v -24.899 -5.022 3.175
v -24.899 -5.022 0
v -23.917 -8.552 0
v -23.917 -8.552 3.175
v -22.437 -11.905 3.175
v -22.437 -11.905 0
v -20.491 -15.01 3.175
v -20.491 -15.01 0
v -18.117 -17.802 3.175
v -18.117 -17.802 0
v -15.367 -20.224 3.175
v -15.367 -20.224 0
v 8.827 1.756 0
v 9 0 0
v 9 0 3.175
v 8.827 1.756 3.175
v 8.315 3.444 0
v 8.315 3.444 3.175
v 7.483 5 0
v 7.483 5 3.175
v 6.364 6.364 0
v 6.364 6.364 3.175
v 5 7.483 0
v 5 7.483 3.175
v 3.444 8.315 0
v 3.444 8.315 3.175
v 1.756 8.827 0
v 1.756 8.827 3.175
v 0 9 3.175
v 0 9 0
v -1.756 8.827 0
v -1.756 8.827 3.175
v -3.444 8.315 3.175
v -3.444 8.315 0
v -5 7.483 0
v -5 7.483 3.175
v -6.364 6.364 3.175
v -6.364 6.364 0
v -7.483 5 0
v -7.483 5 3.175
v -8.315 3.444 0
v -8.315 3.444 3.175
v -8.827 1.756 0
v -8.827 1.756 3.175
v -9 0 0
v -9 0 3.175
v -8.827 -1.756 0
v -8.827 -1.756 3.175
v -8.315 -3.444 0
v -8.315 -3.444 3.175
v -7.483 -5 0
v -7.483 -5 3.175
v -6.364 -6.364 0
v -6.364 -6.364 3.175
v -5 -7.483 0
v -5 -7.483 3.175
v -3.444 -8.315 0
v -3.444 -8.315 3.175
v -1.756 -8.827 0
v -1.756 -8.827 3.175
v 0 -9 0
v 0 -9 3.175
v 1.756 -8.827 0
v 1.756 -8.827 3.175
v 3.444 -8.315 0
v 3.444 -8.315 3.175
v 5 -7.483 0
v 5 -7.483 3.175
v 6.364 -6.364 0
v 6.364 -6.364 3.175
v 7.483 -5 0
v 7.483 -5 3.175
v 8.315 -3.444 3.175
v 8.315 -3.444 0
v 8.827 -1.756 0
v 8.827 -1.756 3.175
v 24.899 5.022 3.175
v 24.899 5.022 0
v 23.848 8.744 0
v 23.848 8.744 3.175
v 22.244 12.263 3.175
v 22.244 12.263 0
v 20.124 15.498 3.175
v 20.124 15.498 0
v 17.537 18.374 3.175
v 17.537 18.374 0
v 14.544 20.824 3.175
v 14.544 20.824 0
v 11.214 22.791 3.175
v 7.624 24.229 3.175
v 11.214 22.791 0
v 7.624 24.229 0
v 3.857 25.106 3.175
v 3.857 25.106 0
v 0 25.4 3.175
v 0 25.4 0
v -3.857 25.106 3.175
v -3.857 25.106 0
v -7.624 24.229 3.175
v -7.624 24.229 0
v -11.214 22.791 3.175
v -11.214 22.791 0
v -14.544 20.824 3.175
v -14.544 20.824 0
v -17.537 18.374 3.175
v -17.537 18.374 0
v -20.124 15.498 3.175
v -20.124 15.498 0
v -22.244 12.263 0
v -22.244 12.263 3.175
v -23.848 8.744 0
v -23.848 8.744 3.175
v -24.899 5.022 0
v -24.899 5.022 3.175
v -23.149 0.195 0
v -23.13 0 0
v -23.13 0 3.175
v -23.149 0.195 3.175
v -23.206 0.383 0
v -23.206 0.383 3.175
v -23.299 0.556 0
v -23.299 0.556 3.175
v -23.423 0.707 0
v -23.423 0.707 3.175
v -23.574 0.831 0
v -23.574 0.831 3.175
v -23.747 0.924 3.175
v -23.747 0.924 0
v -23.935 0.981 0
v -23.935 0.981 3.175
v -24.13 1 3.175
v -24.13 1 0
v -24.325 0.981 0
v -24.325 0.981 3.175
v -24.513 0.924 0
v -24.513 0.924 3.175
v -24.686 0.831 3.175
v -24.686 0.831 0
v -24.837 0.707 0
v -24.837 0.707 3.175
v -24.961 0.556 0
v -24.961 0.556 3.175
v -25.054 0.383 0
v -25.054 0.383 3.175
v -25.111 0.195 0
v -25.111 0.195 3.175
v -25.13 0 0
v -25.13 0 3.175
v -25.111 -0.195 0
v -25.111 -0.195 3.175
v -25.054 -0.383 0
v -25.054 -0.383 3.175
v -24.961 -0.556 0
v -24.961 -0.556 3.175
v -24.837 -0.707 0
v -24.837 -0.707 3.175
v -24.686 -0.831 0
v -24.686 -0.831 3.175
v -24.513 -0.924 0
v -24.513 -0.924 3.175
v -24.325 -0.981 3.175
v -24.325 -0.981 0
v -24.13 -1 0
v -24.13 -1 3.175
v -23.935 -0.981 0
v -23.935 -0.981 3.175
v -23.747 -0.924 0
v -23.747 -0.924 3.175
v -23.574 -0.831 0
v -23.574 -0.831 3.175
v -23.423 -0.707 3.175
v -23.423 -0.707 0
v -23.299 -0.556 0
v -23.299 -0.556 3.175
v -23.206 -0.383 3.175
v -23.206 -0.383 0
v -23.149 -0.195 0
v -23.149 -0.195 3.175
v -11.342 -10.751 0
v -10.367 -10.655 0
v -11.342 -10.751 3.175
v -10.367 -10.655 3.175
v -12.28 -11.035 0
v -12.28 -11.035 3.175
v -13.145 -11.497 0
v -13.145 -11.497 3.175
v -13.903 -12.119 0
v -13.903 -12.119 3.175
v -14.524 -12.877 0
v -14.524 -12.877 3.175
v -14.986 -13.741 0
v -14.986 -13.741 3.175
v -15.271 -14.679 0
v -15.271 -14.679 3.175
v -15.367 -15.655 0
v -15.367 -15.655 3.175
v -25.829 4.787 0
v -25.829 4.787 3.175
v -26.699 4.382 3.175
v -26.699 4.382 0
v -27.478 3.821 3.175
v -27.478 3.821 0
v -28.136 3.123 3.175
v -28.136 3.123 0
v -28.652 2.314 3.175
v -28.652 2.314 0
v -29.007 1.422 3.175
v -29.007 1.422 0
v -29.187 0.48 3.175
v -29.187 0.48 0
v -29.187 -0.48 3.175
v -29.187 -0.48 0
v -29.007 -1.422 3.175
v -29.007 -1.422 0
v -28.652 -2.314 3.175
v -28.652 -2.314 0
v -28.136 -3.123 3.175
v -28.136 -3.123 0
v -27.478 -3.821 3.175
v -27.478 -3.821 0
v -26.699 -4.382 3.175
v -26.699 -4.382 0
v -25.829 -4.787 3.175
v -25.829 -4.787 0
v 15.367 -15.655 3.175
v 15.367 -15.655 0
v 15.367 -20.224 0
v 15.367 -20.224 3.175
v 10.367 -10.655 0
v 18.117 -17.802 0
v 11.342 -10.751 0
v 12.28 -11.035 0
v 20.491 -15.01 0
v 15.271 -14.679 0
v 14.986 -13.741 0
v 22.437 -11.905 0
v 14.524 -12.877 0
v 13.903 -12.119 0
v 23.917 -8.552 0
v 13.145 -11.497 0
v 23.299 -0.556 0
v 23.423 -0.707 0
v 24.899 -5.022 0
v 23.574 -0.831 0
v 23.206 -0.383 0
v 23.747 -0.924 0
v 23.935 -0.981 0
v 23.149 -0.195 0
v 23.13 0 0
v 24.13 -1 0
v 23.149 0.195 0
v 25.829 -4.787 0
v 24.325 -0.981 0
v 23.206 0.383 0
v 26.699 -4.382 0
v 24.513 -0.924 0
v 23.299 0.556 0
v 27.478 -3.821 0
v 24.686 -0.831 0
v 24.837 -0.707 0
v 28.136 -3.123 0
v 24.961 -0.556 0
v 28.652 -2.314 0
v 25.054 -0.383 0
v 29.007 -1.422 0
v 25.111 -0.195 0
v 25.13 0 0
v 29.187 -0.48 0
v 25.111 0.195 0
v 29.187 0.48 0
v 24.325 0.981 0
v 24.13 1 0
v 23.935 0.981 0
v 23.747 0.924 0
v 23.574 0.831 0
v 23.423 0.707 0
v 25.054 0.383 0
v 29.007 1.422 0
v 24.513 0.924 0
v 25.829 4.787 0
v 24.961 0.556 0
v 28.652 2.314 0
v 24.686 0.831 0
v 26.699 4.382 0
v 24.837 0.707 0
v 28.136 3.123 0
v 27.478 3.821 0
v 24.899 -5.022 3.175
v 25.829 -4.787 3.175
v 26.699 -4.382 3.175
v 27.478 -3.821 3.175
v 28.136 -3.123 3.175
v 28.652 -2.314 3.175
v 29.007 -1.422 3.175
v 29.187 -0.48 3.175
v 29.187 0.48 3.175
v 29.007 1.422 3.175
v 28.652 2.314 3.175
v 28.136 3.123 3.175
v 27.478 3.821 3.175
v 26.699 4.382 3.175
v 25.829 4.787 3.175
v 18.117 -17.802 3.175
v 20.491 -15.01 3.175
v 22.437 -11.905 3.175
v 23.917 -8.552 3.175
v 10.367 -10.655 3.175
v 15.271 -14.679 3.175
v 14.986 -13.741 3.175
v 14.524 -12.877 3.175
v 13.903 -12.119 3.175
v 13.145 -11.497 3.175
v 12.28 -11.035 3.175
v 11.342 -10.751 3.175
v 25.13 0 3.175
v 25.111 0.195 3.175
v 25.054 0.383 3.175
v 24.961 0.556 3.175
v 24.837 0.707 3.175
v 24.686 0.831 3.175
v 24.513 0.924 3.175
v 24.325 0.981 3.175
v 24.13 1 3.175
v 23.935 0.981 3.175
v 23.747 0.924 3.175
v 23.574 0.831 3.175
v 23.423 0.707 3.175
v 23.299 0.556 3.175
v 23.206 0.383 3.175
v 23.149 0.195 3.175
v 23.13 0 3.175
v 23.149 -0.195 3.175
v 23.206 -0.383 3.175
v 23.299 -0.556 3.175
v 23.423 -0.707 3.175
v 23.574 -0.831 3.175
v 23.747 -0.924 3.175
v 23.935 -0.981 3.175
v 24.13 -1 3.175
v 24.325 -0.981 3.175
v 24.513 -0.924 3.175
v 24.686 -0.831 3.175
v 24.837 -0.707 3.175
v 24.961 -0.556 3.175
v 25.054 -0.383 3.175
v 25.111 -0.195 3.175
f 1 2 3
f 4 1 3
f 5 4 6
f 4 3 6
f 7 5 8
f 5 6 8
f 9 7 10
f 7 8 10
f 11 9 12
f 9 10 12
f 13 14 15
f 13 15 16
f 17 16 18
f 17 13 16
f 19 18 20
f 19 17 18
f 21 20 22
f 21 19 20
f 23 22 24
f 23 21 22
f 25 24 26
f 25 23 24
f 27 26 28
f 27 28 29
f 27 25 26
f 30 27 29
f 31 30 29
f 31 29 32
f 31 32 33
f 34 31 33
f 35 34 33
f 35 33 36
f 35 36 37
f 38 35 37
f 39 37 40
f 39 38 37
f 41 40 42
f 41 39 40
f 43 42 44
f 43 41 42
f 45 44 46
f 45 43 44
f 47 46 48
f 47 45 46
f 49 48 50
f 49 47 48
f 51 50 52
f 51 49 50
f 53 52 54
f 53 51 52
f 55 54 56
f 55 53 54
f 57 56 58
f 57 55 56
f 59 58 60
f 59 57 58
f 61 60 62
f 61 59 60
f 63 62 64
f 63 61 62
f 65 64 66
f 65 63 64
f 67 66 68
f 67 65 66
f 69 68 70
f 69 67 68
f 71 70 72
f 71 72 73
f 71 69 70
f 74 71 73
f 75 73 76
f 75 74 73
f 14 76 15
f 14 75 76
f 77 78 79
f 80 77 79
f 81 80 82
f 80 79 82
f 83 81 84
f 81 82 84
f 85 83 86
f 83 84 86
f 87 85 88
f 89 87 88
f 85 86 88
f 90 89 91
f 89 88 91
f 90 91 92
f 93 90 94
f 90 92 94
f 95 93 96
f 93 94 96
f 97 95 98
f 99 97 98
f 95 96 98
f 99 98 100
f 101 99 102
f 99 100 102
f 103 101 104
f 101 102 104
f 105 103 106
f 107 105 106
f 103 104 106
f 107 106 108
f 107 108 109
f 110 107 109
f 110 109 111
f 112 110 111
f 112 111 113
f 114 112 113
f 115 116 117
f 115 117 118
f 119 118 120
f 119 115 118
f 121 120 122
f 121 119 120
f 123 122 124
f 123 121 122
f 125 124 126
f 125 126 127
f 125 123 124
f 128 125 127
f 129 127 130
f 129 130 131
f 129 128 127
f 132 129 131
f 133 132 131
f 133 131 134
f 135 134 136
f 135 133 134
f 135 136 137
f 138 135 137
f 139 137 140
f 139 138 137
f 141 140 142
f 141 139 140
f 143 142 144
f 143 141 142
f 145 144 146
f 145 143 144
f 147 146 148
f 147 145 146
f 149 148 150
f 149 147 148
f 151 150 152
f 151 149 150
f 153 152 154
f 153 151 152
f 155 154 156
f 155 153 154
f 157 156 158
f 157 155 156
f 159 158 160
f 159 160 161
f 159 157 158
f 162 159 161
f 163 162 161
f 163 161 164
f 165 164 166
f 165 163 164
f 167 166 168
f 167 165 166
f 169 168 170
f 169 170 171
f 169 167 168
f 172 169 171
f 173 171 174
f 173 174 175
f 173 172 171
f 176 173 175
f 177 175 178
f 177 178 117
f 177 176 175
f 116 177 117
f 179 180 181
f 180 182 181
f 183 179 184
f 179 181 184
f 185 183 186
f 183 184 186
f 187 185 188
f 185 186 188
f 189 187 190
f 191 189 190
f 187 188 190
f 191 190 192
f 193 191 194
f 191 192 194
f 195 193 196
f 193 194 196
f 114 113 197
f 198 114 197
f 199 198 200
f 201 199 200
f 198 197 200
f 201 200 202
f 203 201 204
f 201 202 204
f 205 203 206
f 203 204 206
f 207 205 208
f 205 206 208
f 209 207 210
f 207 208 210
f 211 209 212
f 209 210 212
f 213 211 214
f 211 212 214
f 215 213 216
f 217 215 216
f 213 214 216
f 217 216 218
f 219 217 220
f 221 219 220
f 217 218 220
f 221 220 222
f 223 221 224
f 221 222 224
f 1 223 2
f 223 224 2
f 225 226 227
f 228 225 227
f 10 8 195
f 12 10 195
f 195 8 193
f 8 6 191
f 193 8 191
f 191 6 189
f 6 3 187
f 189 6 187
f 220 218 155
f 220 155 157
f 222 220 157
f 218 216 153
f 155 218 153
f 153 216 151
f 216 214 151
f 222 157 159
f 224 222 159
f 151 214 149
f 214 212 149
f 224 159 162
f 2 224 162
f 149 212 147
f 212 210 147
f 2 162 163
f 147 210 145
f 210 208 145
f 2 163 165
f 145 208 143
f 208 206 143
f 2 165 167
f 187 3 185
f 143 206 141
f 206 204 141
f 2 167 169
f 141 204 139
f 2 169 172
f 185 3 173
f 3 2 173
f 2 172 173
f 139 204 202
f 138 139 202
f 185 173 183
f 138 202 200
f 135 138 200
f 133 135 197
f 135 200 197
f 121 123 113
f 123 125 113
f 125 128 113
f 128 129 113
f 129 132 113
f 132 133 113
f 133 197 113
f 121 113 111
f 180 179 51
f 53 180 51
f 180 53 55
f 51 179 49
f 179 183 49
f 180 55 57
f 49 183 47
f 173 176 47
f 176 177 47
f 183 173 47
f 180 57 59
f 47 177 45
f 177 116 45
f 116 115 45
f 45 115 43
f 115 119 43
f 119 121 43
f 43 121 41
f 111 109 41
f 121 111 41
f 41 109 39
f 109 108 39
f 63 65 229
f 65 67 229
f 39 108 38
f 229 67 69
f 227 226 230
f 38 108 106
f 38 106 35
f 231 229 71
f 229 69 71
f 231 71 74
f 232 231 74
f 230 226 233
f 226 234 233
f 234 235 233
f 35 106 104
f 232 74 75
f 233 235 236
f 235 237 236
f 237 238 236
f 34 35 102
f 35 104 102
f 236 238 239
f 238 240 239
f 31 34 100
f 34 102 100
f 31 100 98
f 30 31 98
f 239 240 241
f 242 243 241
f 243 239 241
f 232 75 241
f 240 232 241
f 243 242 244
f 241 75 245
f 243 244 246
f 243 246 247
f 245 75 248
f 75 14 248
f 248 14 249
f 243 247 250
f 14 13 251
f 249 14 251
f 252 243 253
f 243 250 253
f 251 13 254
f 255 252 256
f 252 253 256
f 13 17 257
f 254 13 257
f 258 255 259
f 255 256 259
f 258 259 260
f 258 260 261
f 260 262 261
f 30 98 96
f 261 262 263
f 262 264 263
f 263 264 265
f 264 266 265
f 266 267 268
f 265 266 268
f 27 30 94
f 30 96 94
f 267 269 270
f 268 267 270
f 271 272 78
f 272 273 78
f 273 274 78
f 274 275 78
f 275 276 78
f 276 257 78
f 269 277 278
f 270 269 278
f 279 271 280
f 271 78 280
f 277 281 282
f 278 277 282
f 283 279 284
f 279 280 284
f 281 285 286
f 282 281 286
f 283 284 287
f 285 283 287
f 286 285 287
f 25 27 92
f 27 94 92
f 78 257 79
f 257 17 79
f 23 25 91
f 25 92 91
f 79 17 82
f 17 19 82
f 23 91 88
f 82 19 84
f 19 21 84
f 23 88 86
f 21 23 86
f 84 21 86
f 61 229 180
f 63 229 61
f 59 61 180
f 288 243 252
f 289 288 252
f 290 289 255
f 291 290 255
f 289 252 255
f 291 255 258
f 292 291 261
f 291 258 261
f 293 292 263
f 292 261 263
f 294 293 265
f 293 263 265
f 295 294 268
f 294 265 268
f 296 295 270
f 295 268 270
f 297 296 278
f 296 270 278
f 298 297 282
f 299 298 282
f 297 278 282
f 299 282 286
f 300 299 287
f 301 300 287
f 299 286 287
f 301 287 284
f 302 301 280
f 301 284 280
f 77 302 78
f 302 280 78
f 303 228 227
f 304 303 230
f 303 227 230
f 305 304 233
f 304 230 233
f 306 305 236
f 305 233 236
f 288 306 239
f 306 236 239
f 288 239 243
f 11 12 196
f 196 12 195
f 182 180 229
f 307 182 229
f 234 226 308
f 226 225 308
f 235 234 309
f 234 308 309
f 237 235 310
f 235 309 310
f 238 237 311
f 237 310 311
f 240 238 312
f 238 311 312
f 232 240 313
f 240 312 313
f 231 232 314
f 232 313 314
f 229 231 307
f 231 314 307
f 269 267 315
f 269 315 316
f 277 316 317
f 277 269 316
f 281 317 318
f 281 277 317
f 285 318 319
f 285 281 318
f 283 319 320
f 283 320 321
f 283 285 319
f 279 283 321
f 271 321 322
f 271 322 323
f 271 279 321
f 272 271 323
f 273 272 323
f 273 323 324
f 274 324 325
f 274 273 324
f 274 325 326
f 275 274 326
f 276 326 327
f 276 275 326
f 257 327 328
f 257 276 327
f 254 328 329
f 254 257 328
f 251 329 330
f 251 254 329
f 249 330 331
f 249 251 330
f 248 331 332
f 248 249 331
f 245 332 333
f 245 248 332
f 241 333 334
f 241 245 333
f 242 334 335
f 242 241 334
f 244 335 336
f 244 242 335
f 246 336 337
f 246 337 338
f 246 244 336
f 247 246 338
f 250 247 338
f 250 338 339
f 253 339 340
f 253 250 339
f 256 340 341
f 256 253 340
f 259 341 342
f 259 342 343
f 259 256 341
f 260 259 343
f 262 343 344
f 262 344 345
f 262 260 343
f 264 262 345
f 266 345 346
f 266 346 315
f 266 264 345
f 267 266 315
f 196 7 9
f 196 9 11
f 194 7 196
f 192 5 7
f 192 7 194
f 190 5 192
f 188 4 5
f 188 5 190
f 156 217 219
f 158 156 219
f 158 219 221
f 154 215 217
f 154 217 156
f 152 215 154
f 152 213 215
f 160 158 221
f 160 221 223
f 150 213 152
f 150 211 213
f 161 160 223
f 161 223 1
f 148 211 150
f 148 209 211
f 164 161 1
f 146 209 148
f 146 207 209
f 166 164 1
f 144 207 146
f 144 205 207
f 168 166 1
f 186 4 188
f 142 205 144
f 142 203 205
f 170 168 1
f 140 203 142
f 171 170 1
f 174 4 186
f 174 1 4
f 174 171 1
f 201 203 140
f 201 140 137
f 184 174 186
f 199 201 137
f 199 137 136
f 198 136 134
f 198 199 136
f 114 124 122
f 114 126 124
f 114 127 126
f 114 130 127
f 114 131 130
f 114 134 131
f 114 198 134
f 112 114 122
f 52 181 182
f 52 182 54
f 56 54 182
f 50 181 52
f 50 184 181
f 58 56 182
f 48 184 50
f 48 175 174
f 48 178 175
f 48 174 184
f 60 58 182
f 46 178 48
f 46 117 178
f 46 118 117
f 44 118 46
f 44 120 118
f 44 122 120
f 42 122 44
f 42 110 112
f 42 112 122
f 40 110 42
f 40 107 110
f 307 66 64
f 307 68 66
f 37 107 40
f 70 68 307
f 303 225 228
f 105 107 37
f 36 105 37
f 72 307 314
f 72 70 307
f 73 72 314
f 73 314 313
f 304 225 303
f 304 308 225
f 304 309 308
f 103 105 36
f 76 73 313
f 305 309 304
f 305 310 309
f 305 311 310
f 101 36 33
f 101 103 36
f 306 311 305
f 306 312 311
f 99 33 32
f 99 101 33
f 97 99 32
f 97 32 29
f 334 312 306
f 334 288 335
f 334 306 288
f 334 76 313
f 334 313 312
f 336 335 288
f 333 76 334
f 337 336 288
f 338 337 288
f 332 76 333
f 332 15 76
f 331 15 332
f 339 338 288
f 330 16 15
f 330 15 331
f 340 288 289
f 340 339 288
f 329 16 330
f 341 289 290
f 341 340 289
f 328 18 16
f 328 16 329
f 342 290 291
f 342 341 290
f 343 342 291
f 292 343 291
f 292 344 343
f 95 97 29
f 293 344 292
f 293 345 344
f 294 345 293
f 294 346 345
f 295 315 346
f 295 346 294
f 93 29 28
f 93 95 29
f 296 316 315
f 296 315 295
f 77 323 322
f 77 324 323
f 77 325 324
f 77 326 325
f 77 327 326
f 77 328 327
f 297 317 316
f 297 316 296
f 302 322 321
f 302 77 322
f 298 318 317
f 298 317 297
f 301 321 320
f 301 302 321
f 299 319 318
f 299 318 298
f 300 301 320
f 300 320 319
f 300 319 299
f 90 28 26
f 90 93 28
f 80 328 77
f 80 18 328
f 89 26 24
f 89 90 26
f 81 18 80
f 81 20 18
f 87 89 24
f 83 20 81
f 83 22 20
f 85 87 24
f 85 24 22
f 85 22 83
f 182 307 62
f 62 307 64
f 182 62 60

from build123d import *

# Parameters (mm, degrees)
SKETCH1_R           = 1
SKETCH1_R_2         = 9
BOSS_EXTRUDE1_DEPTH = 3.175
CUT_EXTRUDE3_DEPTH  = 9.398
FILLET3_R           = 5


with BuildPart() as part:
    # Sketch1 → Boss-Extrude1 (new body)
    with BuildSketch(Plane.XY):
        with BuildLine():
            ThreePointArc((24.898684211, -5.021506207), (29.21, 0), (24.898684211, 5.021506207))
            ThreePointArc((24.898684211, 5.021506207), (0, 25.4), (-24.898684211, 5.021506207))
            ThreePointArc((-24.898684211, 5.021506207), (-29.21, 0), (-24.898684211, -5.021506207))
            ThreePointArc((-24.898684211, -5.021506207), (0, -25.4), (24.898684211, -5.021506207))
        make_face()
        with Locations((-24.13, 0)):
            Circle(SKETCH1_R, mode=Mode.SUBTRACT)
        with Locations((24.13, 0)):
            Circle(SKETCH1_R, mode=Mode.SUBTRACT)
        Circle(SKETCH1_R_2, mode=Mode.SUBTRACT)
    extrude(amount=BOSS_EXTRUDE1_DEPTH)

    # Sketch2 → Cut-Extrude3 (cut)
    with BuildSketch(Plane.XY):
        with BuildLine():
            Line((-15.367, -20.224126953), (-15.367, -10.654548843))
            Line((-15.367, -10.654548843), (15.367, -10.654548843))
            Line((15.367, -10.654548843), (15.367, -20.224126953))
            ThreePointArc((15.367, -20.224126953), (0, -25.4), (-15.367, -20.224126953))
        make_face()
    extrude(amount=CUT_EXTRUDE3_DEPTH, mode=Mode.SUBTRACT)

    # Fillet3
    fillet3_edges = [part.edges().sort_by_distance(p)[0] for p in [
        (15.367, -10.654548843, 1.5875),
        (-15.367, -10.654548843, 1.5875),
    ]]
    fillet(fillet3_edges, radius=FILLET3_R)


solid = part.part
